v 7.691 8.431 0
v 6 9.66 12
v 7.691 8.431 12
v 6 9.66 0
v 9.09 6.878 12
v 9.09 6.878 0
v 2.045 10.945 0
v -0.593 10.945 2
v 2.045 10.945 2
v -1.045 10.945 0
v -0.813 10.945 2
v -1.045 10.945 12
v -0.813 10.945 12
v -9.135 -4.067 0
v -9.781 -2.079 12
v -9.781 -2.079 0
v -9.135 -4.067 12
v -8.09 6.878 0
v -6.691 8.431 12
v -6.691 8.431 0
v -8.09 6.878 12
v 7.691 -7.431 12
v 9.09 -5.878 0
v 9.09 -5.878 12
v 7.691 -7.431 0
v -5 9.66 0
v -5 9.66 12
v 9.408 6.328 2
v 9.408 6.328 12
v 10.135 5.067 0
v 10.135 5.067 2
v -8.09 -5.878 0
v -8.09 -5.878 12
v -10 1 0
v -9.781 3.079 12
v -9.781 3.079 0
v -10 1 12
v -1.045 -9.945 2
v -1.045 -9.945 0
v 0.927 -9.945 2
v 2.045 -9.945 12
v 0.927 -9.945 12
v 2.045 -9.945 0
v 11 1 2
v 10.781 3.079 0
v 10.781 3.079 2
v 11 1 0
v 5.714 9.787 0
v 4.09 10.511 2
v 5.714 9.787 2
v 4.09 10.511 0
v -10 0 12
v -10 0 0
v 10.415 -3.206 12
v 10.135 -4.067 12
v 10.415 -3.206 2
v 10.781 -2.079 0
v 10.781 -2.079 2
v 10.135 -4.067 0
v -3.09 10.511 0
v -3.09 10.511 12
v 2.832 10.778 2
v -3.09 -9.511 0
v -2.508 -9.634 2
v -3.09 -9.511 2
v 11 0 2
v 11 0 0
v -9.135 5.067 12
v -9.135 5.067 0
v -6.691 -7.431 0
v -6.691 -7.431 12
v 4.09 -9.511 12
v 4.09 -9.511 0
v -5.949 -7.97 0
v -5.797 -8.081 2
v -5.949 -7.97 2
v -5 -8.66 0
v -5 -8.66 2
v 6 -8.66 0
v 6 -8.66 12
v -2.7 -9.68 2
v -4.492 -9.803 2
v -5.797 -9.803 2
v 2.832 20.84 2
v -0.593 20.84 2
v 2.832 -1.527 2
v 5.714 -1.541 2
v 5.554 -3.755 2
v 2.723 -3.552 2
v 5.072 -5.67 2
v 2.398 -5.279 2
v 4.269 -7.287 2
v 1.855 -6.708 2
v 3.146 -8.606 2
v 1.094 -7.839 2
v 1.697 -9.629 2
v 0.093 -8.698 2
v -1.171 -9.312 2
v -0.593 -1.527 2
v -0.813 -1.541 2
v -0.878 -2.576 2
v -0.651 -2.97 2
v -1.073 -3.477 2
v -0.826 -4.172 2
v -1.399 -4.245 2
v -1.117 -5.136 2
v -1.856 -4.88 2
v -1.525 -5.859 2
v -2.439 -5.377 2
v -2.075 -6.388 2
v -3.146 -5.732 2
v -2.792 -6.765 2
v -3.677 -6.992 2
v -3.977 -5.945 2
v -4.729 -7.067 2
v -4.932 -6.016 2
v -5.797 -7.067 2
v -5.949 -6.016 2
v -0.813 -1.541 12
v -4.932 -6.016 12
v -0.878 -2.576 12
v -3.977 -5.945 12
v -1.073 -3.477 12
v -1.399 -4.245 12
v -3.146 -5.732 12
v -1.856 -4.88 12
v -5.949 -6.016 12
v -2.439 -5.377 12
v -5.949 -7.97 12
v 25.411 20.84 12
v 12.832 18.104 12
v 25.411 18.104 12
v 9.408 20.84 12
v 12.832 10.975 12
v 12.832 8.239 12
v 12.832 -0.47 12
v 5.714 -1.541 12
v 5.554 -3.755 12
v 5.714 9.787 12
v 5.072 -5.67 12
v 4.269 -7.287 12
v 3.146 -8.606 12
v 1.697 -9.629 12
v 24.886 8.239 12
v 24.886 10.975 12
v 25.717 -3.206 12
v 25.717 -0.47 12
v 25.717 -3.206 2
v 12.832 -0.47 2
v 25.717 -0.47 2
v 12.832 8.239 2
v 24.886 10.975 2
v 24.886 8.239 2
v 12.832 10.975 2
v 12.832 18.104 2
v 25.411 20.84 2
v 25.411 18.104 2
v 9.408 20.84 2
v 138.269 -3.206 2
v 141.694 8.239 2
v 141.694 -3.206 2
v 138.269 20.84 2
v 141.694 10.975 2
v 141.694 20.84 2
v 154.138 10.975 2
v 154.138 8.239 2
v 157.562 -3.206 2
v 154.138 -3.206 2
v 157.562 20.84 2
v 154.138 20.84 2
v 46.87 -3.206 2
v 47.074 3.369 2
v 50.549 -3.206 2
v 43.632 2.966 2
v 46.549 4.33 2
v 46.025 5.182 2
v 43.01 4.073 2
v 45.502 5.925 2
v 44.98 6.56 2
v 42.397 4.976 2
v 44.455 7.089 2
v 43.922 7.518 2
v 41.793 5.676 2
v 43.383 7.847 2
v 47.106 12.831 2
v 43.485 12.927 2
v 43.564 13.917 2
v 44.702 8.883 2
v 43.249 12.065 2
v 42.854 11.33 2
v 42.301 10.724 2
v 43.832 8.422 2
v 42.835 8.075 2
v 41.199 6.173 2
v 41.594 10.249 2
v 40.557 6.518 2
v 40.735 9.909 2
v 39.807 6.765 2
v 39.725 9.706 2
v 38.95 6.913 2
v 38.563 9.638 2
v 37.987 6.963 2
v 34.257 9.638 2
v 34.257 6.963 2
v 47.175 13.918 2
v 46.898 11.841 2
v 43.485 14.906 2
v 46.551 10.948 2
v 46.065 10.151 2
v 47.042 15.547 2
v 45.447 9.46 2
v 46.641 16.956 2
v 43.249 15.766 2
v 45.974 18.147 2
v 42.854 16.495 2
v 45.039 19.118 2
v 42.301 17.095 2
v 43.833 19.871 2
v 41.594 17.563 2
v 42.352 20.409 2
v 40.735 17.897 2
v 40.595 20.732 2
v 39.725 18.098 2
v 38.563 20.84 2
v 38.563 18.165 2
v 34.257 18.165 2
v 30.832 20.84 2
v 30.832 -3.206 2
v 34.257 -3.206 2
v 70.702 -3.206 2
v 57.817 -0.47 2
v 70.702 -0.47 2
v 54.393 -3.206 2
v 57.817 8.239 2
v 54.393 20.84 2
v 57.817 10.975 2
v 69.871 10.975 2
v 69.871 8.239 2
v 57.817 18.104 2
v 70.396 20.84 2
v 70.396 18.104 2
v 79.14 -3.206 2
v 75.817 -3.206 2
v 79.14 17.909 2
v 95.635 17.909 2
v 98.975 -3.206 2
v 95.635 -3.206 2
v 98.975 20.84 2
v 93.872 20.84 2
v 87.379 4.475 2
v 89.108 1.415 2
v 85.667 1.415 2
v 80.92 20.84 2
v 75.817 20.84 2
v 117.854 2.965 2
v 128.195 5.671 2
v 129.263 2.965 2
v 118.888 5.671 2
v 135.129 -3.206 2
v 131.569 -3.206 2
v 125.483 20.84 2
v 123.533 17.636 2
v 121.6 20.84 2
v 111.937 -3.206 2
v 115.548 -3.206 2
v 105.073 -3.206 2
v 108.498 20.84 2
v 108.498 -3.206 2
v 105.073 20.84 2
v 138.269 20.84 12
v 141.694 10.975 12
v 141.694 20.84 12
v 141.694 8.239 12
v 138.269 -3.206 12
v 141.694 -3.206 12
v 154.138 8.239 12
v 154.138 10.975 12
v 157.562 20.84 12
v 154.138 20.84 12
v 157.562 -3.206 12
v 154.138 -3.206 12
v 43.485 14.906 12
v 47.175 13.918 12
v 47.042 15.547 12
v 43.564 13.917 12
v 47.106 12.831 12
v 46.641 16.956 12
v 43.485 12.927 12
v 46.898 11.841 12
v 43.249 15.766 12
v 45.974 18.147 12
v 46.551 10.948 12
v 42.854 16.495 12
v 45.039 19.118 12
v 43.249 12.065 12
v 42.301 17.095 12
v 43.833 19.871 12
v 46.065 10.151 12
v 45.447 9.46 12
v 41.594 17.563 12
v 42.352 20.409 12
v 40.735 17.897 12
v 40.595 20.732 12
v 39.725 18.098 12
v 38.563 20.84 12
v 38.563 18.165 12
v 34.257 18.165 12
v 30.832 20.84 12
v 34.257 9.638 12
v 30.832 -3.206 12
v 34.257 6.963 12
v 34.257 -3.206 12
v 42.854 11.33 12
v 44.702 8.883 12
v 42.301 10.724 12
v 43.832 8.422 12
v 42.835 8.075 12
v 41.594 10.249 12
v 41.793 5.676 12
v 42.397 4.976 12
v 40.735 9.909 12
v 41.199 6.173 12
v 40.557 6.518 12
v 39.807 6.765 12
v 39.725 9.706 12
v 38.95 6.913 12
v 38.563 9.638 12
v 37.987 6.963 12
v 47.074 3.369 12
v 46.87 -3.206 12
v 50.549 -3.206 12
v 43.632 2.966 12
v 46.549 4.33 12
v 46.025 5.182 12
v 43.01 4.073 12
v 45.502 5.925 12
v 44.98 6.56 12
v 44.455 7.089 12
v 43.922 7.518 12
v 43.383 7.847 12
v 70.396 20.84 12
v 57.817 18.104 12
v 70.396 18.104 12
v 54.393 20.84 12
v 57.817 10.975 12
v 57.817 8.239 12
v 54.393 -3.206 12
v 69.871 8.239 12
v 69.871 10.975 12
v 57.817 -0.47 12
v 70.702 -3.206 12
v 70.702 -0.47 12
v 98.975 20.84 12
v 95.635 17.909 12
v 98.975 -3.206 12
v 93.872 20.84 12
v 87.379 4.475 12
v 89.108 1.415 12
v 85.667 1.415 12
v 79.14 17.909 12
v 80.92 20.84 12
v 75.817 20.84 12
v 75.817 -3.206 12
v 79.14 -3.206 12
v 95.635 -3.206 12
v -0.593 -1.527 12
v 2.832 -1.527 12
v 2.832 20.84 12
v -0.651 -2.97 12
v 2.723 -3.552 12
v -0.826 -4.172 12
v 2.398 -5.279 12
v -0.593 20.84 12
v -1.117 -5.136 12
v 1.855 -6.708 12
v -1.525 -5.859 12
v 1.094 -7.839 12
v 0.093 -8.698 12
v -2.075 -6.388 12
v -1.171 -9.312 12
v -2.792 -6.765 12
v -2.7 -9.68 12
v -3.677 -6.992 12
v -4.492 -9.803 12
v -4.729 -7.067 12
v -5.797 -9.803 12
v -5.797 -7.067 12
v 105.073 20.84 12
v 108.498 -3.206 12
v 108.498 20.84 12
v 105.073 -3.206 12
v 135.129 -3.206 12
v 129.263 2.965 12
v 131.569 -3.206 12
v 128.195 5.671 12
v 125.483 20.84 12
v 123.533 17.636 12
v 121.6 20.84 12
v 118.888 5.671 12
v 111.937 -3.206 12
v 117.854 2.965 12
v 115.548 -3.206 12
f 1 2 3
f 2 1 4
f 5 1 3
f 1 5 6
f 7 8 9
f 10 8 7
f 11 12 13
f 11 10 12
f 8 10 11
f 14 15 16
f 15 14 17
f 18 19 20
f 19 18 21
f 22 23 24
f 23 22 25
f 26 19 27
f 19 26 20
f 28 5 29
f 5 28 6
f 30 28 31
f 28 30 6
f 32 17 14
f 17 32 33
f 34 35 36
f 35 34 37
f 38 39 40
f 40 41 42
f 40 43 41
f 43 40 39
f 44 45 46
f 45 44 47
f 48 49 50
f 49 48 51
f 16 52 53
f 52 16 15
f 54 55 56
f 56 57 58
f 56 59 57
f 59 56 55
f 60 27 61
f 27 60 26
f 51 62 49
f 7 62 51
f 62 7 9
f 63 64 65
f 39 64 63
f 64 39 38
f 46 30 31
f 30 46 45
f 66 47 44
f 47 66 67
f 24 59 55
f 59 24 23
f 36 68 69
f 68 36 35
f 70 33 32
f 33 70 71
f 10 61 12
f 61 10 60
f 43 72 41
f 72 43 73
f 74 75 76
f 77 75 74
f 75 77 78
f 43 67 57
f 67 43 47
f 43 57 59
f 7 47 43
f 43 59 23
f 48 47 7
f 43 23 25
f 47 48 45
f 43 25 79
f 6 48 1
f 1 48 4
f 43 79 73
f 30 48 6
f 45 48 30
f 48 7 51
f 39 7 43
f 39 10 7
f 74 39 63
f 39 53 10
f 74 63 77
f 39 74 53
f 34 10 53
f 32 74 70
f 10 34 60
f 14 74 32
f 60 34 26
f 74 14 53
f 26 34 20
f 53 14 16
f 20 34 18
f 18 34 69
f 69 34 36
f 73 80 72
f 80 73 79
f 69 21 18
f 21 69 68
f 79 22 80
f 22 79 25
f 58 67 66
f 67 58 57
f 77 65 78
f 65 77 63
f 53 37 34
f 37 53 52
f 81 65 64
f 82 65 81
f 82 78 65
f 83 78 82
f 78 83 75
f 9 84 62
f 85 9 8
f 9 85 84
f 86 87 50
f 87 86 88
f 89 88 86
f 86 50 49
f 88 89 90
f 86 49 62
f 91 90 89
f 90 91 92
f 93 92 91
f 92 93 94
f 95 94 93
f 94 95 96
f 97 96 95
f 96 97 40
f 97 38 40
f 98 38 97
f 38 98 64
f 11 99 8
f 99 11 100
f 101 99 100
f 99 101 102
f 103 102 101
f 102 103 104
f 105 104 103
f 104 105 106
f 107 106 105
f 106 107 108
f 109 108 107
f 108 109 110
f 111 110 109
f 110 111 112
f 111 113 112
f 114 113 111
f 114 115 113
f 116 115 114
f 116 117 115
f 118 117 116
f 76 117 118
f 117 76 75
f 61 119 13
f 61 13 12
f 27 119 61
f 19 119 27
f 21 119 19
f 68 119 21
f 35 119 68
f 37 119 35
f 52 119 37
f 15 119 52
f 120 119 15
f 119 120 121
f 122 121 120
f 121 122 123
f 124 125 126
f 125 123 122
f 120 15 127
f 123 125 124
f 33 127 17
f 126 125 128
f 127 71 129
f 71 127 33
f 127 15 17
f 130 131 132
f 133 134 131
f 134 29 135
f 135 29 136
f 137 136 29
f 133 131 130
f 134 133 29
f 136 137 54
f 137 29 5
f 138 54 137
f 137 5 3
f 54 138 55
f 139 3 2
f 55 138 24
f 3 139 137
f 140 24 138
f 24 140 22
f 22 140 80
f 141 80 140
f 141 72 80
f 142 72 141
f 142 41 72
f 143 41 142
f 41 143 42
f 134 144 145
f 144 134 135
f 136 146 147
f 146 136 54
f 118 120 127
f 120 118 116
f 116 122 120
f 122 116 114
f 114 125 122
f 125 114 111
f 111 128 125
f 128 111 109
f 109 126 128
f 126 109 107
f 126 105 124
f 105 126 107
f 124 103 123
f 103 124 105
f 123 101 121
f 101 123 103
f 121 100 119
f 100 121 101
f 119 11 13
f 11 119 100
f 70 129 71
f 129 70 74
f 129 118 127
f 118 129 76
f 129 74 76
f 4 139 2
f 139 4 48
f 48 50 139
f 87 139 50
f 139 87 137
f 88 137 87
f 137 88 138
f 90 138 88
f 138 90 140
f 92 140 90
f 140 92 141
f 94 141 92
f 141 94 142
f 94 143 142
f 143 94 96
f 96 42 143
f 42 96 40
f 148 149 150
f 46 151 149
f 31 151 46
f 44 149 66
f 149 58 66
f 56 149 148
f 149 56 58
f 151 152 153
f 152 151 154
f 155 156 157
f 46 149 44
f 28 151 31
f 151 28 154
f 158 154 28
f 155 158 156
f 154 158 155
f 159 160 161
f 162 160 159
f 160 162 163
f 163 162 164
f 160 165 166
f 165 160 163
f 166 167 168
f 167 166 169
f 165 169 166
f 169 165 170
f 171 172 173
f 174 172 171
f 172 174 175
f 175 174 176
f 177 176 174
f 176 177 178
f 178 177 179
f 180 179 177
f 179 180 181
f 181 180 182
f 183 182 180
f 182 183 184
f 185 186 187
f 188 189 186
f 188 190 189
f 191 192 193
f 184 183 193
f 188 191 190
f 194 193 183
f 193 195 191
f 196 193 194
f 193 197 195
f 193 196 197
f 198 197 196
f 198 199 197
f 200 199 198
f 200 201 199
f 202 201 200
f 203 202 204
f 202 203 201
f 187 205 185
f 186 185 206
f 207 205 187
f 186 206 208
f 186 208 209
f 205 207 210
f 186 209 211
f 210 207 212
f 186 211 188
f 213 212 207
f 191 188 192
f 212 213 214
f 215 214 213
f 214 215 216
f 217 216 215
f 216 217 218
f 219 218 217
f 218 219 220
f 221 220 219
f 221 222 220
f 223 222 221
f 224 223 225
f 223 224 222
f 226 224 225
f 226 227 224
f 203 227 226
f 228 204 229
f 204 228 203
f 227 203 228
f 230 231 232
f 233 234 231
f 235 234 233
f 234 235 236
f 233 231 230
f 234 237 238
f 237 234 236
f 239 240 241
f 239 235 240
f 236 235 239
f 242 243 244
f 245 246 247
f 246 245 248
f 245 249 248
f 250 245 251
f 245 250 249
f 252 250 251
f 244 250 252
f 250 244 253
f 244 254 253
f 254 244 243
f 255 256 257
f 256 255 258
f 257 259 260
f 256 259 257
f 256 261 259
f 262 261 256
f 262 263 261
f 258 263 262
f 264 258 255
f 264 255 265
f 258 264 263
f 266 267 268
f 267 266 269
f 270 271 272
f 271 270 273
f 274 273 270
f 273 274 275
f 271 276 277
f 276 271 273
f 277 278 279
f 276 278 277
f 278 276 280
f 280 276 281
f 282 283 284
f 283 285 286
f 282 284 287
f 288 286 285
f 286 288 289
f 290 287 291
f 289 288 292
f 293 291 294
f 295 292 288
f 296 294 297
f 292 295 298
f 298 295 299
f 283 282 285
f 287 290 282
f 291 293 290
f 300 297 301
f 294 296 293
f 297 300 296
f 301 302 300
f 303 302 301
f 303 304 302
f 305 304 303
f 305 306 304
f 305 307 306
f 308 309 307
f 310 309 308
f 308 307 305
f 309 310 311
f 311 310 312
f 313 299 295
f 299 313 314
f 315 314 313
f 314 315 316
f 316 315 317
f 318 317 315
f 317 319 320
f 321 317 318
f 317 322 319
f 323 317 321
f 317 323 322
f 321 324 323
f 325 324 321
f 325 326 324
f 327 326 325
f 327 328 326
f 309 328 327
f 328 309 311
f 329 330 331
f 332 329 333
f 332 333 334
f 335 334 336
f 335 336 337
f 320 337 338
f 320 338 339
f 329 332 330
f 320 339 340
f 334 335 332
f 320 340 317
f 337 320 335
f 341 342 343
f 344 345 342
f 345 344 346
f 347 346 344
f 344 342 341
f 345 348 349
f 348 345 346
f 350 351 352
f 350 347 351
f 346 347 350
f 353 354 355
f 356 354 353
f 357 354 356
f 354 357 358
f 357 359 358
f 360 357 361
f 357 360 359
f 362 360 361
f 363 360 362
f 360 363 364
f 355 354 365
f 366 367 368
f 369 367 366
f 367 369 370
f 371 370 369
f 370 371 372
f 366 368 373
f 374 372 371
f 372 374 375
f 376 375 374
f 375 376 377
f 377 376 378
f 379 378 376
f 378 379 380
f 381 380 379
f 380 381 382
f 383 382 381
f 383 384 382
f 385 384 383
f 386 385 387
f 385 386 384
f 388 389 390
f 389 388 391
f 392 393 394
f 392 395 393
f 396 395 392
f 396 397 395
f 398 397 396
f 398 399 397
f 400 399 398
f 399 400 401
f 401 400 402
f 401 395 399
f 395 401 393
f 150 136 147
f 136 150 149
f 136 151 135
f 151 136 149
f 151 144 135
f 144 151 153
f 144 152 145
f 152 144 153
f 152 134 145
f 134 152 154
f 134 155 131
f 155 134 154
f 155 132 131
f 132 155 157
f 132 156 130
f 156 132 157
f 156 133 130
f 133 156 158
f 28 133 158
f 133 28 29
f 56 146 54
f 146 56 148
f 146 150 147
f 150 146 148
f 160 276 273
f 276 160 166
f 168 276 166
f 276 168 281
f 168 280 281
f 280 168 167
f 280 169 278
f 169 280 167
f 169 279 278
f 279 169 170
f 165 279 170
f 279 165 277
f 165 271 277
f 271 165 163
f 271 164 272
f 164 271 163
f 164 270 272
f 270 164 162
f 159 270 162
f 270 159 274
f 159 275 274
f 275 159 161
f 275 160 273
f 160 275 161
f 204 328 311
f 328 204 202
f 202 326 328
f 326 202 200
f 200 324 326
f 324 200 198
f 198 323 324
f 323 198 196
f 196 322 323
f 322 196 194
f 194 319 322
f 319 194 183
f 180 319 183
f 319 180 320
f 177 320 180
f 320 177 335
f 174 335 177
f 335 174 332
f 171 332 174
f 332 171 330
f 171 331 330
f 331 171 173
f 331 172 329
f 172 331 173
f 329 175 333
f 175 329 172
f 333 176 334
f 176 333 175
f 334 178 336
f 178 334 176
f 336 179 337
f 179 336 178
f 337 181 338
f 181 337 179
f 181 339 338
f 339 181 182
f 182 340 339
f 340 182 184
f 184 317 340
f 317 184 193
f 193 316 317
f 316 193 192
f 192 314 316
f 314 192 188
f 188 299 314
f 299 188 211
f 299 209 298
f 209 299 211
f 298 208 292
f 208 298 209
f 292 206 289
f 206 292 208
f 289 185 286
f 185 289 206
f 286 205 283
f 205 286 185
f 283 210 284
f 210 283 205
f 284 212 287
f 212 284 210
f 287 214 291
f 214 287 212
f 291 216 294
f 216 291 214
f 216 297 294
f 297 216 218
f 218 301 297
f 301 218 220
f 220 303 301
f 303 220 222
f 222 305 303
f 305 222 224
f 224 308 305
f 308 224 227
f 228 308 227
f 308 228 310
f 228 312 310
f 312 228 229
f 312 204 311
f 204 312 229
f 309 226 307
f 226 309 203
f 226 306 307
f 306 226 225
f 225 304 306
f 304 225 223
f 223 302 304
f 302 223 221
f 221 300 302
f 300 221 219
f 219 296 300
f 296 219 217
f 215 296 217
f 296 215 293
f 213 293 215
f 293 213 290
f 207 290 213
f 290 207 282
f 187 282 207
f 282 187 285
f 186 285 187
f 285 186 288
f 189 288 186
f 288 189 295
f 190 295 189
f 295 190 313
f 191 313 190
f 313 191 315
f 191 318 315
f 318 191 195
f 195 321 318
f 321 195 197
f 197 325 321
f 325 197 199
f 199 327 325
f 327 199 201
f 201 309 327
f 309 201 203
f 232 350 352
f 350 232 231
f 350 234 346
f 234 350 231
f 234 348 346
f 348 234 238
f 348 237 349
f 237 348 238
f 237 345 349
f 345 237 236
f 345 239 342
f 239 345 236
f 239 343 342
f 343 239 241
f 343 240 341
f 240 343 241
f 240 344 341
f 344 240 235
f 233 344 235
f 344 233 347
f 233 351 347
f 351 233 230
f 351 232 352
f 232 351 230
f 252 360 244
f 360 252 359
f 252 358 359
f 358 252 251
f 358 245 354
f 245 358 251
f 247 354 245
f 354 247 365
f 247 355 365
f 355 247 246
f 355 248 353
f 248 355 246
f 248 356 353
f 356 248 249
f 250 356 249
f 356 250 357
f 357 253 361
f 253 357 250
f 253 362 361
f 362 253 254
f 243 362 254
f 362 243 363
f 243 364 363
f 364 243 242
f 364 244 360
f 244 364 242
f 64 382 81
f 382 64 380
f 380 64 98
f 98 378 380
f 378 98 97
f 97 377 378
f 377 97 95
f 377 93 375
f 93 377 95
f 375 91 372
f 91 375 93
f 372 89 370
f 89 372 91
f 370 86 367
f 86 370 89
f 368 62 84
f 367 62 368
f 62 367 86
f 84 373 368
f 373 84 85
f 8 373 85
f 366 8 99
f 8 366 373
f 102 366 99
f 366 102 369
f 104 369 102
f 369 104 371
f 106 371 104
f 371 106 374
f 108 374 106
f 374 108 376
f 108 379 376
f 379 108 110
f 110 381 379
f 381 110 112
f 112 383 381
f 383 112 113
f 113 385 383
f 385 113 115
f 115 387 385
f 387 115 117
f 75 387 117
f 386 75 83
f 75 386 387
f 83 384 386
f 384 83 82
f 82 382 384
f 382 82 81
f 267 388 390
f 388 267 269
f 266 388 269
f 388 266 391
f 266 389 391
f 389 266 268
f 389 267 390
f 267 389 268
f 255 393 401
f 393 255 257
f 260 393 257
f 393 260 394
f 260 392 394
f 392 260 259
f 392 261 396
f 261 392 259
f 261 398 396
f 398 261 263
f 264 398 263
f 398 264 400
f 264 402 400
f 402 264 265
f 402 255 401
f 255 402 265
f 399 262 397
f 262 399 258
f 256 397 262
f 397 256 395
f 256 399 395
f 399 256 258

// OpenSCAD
use <fontmetrics.scad>; // https://www.thingiverse.com/thing:3004457

NAME = "JEREMIAH";
MAX_WIDTH = 200;
BASE_DEPTH = 2;
SLOT_DEPTH = 10;
BORDER_RADIUS=10;
PADDING = -4;

FONT = "Comic Sans MS";

module name(value, size, bold = true) {
  bold_font = str(FONT, ":style=Bold");
  text(value, size, font = bold ? bold_font : FONT);
}

function namelen(value, size) = measureText(
    value,
    font=FONT,
    size=size);

module name_box(value, width, base_depth, slot_depth, font_size) {
  module name_square() {
    minkowski() {
      circle(r=BORDER_RADIUS);
      translate([-PADDING, -PADDING, 0]) {
        square(
          [width + (2 * PADDING),
          font_size + (2 * PADDING)]
        );
      }
    }
  }

	translate([PADDING, PADDING, 0]) {
		linear_extrude(base_depth) {
			name_square();
		}
		linear_extrude(base_depth + slot_depth) {
			difference() {
				name_square();
				name(value, font_size);
			}
		}
	}
}

module name_3d(value, base_depth, slot_depth, font_size) {
  scale([1, 0.95, 1])
  translate([PADDING, PADDING + (0.025 * font_size), base_depth]) {
    linear_extrude(slot_depth) {
      name(NAME, font_size, bold = false);
    }
  }
}

font_size = MAX_WIDTH / len(NAME);
width = namelen(NAME, font_size);

name_box(NAME, width, BASE_DEPTH, SLOT_DEPTH, font_size);
name_3d(NAME, BASE_DEPTH, SLOT_DEPTH, font_size);
